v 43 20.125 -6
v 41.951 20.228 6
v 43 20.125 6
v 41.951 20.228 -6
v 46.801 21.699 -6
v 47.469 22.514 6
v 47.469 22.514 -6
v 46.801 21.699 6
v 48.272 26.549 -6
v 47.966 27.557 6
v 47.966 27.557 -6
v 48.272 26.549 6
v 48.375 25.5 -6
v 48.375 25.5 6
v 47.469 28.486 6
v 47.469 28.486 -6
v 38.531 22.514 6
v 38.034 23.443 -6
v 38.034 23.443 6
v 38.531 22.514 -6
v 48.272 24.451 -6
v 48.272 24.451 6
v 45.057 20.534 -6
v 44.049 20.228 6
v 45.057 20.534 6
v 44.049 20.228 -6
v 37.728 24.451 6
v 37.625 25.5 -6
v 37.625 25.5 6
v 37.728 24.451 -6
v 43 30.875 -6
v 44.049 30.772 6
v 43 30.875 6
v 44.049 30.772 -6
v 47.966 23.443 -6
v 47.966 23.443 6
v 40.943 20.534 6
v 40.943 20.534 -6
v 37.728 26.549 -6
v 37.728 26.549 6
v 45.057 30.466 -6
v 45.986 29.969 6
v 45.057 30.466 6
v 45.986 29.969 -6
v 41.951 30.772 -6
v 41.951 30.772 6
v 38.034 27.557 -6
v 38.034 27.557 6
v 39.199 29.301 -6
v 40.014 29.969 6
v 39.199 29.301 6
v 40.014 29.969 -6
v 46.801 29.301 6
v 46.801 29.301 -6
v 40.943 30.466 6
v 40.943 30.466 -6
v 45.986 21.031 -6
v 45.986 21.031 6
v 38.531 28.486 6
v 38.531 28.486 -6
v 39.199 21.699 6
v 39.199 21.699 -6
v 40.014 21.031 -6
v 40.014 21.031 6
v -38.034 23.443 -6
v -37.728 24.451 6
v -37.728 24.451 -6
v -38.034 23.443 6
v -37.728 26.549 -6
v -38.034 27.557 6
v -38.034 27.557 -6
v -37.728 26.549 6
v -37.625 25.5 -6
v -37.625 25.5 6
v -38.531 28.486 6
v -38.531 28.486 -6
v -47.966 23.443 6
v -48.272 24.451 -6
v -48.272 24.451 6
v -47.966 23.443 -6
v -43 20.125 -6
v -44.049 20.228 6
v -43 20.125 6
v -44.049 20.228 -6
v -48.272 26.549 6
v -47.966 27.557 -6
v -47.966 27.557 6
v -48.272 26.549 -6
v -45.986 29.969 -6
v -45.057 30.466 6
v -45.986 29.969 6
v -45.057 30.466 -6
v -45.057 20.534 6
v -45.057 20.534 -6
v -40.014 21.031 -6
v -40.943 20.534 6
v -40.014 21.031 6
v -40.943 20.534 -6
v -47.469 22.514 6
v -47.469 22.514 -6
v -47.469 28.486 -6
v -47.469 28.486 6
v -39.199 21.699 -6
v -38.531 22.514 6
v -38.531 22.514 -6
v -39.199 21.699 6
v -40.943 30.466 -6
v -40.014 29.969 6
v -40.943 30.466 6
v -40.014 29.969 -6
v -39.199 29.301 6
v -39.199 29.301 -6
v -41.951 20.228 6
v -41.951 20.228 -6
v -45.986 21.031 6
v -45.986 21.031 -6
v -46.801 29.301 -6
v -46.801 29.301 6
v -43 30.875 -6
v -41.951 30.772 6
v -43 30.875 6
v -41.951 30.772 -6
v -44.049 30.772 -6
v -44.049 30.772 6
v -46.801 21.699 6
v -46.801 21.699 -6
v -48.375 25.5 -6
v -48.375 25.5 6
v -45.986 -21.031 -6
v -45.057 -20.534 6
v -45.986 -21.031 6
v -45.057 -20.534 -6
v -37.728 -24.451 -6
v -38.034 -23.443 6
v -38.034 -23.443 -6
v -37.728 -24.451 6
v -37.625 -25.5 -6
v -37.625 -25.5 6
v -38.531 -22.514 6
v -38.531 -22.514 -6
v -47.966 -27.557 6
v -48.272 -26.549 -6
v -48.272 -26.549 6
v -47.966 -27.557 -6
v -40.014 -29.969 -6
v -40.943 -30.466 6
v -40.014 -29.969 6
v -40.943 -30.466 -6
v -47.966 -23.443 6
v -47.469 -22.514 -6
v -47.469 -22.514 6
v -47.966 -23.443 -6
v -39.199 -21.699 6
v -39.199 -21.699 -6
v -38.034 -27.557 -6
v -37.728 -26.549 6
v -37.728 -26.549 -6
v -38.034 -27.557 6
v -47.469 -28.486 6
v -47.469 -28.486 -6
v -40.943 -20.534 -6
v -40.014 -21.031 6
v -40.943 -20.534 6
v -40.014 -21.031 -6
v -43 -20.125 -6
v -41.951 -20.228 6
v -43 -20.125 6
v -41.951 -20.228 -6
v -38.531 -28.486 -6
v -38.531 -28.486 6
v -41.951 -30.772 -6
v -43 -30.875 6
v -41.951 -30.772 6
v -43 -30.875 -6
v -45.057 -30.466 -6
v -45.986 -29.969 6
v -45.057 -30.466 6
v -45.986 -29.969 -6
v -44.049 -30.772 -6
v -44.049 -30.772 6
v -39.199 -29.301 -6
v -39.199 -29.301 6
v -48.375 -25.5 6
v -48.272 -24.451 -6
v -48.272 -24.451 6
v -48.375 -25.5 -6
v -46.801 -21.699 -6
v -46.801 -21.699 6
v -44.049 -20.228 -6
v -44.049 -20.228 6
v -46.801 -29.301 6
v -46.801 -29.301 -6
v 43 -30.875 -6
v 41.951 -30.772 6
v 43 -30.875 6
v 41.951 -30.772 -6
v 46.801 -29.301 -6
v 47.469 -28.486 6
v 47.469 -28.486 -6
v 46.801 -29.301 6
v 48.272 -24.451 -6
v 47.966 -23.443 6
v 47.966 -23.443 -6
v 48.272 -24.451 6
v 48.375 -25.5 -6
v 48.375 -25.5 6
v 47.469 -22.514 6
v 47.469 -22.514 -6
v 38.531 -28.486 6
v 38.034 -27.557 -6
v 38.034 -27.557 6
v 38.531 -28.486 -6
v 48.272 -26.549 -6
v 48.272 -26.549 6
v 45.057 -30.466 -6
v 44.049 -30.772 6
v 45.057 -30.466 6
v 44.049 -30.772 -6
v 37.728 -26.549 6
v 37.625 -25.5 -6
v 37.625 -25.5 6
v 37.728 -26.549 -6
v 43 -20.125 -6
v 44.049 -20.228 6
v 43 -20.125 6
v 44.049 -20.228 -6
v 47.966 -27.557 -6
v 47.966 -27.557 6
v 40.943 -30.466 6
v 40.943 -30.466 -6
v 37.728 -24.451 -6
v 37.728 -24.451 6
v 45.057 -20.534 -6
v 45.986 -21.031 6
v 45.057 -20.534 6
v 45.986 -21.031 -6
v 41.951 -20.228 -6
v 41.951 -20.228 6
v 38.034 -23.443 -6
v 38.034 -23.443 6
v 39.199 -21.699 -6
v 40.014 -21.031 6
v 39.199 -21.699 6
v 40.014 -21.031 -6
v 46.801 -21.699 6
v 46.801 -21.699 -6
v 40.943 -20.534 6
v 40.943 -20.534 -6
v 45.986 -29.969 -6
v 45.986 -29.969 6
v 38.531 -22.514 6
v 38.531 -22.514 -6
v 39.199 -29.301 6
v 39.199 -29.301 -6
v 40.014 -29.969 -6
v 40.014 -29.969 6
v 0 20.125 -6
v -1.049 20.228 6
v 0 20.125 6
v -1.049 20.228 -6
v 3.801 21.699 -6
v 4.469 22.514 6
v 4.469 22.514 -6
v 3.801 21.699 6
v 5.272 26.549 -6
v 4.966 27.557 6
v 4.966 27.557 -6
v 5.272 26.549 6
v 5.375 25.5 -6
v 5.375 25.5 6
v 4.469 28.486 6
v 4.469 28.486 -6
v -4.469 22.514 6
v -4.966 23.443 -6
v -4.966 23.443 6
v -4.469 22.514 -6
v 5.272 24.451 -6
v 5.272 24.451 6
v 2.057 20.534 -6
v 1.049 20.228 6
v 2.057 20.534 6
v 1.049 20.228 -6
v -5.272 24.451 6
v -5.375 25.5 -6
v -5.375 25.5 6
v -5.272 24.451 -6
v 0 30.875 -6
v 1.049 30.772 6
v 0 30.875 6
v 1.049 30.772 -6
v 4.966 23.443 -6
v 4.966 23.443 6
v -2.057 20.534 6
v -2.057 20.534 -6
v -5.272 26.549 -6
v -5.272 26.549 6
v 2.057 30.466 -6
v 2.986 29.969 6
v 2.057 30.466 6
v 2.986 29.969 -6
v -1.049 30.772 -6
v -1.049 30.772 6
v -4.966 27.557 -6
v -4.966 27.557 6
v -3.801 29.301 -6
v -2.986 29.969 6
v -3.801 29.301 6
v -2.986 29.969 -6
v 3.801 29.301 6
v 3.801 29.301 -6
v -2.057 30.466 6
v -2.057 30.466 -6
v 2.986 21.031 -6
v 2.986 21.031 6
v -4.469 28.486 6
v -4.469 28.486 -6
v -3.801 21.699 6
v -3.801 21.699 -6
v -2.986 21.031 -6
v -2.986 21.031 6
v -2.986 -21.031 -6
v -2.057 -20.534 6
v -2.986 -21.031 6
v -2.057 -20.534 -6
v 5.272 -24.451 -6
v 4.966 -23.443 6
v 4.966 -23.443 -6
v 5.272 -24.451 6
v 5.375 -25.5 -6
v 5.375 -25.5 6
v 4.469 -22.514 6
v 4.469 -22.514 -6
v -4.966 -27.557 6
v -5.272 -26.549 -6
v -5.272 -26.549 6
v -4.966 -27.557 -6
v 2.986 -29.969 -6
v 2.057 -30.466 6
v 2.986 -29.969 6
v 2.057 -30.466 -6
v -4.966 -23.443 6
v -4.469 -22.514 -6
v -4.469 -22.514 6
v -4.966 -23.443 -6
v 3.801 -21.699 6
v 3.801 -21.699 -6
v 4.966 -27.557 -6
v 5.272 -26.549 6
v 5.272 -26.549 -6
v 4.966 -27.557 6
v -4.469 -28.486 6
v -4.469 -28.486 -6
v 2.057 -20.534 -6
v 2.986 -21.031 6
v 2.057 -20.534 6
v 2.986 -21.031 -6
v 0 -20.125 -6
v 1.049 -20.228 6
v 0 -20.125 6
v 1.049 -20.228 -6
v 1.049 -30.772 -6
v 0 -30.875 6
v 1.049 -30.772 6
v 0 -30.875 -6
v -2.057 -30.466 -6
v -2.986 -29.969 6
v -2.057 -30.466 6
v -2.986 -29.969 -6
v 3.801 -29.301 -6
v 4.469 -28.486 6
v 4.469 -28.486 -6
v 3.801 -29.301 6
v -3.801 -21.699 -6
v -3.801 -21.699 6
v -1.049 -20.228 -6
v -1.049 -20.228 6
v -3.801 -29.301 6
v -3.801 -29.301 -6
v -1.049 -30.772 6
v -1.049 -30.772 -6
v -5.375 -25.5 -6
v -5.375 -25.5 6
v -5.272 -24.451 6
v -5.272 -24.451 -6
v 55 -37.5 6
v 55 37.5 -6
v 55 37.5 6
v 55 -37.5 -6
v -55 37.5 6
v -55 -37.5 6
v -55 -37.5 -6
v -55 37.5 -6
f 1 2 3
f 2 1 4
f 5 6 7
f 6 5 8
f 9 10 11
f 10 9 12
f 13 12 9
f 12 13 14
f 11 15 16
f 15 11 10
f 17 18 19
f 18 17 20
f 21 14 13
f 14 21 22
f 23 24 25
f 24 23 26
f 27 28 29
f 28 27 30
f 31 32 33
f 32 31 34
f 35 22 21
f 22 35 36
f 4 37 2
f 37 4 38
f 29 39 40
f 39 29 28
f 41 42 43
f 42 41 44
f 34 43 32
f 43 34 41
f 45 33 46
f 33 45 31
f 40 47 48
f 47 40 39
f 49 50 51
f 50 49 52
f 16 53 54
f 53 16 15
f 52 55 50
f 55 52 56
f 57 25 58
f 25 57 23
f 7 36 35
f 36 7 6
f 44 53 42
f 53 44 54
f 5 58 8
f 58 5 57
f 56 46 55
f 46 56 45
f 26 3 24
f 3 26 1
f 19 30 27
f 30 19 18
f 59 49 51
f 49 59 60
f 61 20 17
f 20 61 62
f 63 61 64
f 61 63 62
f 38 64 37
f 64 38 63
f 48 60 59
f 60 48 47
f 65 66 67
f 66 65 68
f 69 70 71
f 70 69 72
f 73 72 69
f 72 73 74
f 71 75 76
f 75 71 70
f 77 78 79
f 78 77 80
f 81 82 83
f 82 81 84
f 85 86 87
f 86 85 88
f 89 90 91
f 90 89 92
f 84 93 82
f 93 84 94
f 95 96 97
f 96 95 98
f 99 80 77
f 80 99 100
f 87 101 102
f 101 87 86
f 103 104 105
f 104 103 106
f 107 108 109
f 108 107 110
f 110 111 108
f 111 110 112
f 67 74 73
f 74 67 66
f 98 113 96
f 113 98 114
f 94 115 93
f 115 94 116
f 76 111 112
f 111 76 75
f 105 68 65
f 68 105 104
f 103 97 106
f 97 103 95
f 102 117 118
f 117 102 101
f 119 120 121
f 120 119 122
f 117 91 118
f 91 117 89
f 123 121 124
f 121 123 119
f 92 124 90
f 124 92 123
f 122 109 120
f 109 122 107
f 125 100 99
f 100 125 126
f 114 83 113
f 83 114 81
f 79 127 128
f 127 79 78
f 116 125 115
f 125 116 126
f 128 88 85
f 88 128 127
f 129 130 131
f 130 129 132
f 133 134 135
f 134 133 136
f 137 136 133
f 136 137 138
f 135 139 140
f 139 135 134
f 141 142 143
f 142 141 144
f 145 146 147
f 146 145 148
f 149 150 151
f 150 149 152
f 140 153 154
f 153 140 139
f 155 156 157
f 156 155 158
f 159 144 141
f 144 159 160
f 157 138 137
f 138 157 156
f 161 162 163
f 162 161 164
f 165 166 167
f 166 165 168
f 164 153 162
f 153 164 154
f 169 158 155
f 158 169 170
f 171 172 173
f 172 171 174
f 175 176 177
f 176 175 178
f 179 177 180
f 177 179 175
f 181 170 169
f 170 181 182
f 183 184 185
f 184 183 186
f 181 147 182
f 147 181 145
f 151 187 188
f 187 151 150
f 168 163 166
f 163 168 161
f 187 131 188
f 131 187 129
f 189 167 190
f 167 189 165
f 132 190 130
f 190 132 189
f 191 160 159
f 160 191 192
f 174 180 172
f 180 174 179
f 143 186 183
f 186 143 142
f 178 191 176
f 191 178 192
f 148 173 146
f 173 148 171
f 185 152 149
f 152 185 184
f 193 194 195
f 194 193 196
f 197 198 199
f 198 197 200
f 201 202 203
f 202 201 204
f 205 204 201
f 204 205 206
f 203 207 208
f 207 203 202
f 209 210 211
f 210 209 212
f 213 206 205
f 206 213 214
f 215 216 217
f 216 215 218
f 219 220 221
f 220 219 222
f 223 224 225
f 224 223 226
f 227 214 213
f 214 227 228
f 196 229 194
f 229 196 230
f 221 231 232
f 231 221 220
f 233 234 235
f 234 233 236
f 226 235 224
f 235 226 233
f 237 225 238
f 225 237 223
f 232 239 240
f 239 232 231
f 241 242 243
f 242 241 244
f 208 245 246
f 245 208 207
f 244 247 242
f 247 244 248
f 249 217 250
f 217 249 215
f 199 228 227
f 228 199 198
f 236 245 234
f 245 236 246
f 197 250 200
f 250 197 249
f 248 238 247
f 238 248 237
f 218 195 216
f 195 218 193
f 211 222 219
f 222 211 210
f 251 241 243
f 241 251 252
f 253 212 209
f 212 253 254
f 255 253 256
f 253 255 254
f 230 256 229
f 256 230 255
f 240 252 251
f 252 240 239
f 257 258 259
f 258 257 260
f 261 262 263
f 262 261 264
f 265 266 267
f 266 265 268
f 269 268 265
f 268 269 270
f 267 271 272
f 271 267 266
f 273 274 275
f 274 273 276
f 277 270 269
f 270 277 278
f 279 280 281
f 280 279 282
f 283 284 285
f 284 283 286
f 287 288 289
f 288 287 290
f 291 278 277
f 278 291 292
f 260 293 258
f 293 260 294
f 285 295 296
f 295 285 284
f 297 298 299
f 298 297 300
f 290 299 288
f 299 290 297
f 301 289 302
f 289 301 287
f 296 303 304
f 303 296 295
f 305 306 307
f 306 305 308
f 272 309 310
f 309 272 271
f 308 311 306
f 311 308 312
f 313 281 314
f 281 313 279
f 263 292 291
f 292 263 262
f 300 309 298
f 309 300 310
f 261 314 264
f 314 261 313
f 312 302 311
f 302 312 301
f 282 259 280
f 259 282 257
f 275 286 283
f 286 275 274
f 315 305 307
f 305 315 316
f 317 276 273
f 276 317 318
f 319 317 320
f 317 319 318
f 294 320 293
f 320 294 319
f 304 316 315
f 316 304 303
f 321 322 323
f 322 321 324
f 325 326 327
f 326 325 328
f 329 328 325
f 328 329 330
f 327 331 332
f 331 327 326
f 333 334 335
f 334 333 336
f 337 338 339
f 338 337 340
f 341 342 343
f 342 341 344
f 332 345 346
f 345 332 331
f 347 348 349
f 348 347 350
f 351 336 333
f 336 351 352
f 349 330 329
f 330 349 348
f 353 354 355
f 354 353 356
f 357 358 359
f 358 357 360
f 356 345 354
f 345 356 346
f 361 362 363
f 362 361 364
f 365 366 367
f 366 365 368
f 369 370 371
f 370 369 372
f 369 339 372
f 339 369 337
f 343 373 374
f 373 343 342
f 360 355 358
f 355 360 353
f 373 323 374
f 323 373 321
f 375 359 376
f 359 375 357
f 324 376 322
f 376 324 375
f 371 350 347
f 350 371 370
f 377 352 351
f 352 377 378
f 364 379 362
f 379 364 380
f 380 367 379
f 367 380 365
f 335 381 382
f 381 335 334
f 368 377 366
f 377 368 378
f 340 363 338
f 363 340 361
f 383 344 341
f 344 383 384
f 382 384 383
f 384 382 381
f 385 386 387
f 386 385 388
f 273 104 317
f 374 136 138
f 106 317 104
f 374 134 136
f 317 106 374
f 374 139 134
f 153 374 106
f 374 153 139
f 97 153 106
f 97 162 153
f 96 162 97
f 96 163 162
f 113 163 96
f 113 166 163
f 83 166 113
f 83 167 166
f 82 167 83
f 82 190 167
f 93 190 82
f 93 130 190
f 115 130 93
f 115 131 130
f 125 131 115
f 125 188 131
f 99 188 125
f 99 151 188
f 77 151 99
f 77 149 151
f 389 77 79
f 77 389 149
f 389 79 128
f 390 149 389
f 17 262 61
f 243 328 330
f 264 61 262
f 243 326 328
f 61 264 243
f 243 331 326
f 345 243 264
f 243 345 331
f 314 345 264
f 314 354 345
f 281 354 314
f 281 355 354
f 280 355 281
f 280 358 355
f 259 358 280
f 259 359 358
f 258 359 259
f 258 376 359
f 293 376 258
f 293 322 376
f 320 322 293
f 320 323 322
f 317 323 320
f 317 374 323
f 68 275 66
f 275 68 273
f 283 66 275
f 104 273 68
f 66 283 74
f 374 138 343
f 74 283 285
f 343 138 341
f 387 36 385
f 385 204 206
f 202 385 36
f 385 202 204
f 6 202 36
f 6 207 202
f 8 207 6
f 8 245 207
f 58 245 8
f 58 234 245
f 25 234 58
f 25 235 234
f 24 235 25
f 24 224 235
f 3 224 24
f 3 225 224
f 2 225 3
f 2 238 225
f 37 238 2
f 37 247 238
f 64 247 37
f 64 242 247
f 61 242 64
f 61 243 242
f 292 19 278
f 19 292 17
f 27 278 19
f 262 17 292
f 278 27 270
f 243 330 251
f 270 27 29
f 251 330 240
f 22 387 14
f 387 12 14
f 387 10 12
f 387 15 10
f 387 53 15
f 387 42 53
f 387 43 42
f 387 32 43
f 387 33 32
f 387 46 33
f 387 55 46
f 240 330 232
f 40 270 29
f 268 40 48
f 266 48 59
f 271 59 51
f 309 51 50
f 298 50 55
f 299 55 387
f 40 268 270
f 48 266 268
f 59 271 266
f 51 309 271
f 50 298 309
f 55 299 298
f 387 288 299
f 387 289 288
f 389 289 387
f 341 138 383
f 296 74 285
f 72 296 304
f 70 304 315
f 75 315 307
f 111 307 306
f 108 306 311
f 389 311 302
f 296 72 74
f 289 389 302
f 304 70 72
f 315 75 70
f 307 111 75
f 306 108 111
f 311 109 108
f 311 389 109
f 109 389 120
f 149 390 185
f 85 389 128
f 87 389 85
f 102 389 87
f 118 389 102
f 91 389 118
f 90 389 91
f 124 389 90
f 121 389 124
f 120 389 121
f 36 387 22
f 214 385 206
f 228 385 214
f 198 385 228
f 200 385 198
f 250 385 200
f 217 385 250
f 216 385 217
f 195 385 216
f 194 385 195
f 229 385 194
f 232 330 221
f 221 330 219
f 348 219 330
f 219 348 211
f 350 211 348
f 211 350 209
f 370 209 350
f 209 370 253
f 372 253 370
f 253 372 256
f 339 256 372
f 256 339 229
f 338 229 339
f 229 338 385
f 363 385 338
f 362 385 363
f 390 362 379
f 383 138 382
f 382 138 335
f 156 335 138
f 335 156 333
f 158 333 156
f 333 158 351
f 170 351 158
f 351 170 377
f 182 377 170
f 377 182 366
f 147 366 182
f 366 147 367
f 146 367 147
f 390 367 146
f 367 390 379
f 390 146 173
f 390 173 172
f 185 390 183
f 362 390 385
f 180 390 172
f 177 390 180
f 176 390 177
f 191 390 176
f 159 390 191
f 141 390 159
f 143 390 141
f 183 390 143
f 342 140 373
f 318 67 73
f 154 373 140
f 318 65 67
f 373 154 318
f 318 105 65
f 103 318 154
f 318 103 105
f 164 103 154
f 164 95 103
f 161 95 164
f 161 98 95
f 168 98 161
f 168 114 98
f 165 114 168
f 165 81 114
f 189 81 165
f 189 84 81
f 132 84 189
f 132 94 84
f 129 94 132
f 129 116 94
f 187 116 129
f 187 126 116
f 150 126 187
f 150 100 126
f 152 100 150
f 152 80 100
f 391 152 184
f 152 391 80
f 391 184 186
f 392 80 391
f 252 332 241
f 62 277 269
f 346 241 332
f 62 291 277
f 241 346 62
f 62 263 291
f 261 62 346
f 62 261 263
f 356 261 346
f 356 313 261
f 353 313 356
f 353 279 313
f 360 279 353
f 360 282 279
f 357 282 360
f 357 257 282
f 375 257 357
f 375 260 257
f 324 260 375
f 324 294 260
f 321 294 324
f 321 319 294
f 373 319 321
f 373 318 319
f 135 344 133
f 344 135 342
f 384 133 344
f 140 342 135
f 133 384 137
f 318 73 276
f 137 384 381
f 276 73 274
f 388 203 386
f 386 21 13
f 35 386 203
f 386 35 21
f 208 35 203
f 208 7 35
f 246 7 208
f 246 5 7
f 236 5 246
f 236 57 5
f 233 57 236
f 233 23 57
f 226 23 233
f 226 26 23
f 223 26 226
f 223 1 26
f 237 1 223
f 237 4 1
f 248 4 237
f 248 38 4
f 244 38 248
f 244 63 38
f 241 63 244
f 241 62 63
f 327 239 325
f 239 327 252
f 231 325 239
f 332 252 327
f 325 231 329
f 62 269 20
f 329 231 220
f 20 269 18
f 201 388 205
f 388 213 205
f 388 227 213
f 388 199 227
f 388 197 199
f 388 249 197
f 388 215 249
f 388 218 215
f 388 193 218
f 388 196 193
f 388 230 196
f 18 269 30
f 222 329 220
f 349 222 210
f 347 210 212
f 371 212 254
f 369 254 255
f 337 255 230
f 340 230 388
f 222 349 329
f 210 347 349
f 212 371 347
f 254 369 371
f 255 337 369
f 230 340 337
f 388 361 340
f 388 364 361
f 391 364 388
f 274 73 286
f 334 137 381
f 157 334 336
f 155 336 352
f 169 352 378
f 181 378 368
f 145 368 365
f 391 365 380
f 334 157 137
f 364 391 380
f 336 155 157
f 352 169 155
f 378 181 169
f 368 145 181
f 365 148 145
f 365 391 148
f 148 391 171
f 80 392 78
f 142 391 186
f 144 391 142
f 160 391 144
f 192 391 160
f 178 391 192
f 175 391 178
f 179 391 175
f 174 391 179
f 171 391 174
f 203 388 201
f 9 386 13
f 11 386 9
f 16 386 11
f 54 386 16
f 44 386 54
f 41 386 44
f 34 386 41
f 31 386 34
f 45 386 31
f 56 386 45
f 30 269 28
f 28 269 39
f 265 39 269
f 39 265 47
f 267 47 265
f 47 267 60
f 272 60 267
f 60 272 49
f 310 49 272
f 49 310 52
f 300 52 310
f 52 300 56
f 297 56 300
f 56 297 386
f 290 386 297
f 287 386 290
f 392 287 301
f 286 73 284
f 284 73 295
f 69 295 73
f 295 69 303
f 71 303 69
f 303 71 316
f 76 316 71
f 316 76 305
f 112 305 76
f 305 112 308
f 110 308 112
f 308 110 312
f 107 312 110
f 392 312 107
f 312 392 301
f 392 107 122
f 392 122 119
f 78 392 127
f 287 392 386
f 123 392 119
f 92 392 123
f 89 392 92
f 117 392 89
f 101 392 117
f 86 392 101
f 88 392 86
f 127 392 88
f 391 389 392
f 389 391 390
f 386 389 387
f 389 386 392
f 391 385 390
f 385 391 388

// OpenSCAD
$fn = 32;

// ----------------------------------------------------------------------
// Corner plate 110 x 75 x 12
// 6 holes, centres taken from the edge offset
// ----------------------------------------------------------------------

// --- parameters (mm) ---
plate = [110, 75, 12];   // overall size (x, y, z)
holes = 6;               // number of holes the drawing asks for
bore_d = 10.5;           // nominal hole diameter from the drawing
print_allowance = 0.25;  // clearance added for printing
edge = 12;               // hole centre offset from the plate edge

// --- derived feature positions (mm) ---
hole_d = bore_d + print_allowance;  // = 10.75   hole diameter as printed
corner_x = plate[0] / 2 - edge;     // = 43   corner hole X
corner_y = plate[1] / 2 - edge;     // = 25.5   corner hole Y
feature_centers = [
  [corner_x, corner_y],
  [-corner_x, corner_y],
  [-corner_x, -corner_y],
  [corner_x, -corner_y],
  [0, corner_y],
  [0, -corner_y]
];   // hole centres the loop below drills

// plate outline, every hole drilled through with the same cutters
difference() {
  cube(plate, center = true);
  for (centre = feature_centers)
    translate([centre[0], centre[1], 0])
      cylinder(d = hole_d, h = plate[2] + 2, center = true);
}
